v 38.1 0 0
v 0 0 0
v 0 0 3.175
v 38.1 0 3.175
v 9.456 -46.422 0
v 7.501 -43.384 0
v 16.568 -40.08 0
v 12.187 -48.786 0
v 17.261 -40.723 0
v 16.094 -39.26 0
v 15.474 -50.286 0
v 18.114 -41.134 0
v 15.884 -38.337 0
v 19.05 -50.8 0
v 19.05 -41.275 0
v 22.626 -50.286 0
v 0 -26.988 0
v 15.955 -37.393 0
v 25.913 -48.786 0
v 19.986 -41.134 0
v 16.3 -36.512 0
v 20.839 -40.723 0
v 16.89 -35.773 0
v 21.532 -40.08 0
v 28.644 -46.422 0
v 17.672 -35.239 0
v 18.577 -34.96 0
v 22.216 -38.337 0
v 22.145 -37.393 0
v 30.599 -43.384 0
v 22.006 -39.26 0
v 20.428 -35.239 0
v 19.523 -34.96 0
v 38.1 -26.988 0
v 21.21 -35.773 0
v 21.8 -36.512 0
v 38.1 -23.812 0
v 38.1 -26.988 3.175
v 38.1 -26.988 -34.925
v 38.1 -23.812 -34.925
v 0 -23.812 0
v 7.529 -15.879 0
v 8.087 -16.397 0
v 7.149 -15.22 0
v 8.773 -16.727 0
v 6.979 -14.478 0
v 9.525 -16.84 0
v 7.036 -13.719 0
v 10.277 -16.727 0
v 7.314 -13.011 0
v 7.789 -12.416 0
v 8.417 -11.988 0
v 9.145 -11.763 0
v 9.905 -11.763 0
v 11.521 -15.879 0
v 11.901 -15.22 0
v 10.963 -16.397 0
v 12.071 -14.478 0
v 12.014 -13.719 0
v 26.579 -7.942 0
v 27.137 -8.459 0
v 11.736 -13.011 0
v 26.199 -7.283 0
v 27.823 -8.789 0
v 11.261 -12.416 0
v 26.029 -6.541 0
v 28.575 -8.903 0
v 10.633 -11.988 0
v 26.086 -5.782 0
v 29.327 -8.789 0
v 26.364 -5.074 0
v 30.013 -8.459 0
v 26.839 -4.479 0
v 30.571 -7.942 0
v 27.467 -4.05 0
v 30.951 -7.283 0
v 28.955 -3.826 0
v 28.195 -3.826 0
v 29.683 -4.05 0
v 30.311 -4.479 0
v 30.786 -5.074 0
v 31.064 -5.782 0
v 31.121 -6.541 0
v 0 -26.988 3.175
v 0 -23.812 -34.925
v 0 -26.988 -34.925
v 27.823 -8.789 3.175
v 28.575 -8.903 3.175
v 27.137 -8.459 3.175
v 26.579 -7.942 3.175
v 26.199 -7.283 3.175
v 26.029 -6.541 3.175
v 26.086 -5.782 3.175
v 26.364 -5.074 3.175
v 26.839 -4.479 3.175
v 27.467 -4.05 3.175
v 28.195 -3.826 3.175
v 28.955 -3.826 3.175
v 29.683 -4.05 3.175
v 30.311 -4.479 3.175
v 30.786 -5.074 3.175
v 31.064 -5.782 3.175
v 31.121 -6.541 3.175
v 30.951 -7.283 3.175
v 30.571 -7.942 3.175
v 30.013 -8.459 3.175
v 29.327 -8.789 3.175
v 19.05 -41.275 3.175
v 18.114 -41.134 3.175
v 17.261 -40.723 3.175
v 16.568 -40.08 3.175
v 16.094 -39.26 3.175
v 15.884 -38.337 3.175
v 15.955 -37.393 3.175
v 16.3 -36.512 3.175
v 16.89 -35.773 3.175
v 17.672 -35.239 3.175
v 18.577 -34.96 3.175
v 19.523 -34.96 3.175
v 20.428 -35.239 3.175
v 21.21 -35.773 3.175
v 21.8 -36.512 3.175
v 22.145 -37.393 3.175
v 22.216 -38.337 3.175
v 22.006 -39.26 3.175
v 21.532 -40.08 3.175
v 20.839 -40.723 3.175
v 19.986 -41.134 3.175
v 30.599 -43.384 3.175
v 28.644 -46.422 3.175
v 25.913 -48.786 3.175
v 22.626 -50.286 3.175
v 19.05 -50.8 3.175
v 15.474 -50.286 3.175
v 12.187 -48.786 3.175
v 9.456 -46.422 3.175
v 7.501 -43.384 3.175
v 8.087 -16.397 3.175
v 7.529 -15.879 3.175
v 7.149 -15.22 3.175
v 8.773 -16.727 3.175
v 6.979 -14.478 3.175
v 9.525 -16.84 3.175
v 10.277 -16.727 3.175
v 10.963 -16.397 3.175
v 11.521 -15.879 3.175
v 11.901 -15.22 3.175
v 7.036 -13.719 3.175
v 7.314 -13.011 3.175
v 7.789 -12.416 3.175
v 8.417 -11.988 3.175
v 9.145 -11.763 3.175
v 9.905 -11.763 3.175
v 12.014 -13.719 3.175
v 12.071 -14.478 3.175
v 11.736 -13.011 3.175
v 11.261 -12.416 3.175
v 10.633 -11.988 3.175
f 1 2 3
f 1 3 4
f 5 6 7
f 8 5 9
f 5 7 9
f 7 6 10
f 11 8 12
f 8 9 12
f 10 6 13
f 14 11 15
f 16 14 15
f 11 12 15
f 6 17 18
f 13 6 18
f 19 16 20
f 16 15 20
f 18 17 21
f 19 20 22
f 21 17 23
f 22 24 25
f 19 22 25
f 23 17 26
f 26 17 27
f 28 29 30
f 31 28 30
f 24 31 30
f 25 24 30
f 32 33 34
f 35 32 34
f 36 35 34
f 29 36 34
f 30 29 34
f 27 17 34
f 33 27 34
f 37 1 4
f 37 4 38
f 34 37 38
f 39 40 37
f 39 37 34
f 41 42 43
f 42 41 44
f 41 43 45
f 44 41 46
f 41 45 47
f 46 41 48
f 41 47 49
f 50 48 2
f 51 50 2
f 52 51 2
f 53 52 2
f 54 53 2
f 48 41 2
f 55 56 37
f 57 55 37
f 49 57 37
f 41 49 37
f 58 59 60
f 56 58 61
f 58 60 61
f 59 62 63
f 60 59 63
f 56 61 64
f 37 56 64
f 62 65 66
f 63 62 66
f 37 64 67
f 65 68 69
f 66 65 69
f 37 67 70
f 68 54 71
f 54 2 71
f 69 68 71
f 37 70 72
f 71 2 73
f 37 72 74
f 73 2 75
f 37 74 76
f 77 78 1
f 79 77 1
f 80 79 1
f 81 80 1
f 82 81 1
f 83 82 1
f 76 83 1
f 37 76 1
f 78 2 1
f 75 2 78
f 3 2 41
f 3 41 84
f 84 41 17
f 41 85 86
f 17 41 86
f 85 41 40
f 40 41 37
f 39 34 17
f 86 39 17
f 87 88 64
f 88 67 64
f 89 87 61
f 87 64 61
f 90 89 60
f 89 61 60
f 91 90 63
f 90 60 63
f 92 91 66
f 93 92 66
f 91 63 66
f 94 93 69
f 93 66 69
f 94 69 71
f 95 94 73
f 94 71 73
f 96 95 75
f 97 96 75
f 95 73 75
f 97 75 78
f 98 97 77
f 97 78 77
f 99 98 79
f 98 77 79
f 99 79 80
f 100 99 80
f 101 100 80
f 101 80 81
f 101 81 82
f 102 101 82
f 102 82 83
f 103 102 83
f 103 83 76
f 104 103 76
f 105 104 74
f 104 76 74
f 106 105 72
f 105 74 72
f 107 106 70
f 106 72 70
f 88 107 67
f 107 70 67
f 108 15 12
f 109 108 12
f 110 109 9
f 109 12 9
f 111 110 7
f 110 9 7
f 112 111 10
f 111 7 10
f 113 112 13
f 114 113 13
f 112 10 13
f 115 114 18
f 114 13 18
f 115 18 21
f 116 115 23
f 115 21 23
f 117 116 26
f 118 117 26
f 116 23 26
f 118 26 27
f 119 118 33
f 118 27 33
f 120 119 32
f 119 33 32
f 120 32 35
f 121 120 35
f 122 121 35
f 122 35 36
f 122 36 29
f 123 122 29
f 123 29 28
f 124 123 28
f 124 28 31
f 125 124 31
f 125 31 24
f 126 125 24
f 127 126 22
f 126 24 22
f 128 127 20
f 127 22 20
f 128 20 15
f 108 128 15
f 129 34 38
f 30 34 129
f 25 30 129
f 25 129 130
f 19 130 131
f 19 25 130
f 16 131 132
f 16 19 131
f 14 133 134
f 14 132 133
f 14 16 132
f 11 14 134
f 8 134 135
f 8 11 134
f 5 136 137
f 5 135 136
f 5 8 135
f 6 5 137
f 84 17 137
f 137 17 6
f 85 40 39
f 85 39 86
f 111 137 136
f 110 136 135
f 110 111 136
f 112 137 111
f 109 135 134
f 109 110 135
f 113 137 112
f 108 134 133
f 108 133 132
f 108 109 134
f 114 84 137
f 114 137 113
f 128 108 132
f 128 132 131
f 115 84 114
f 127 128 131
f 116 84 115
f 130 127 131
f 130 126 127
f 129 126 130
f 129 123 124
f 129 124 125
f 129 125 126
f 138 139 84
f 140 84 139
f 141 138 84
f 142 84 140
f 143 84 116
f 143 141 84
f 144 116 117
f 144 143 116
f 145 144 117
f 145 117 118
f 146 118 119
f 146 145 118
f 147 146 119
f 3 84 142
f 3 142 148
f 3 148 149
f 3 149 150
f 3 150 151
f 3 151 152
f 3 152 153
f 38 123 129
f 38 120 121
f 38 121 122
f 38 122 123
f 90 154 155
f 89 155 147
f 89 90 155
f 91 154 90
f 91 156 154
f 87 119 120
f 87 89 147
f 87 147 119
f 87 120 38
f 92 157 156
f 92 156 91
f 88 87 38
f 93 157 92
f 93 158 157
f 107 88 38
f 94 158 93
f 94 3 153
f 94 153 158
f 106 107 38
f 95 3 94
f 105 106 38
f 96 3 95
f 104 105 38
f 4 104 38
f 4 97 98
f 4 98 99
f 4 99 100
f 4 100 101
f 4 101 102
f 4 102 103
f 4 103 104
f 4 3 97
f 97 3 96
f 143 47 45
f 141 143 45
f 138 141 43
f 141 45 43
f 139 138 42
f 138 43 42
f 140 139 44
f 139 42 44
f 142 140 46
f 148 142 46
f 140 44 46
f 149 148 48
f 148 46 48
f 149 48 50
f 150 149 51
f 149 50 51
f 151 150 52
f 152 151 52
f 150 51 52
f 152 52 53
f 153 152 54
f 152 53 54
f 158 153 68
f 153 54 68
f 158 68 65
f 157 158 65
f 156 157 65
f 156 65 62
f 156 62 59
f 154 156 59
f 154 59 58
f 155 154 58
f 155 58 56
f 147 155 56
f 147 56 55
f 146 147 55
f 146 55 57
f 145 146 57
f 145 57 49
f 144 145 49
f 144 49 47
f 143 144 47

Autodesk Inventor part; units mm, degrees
ref_plane "YZ Plane" through (0, 0, 0) normal (1, 0, 0) x (0, 1, 0)
ref_plane "XZ Plane" through (0, 0, 0) normal (0, 1, 0) x (-1, 0, 0)
ref_plane "XY Plane" through (0, 0, 0) normal (0, 0, 1) x (1, 0, 0)
sketch "Sketch1" plane through (0, 0, 0) normal (0, 0, 1) x (1, 0, 0)
  line L0 (0, 0) -> (38.1, 0)
  line L1 (38.1, 0) -> (38.1, -26.9875)
  line L2 (0, 0) -> (0, -26.9875)
  line L3 (0, -26.9875) -> (7.5012, -43.3836)
  line L4 (38.1, -26.9875) -> (30.5988, -43.3836)
  arc A0 (7.5012, -43.3836) -> (30.5988, -43.3836) centre (19.05, -38.1) ccw
  line L5 (38.1, -25.4) -> (0, -25.4) construction
  line L6 (38.1, -26.9875) -> (0, -26.9875) construction
  line L7 (38.1, -23.8125) -> (0, -23.8125) construction
  dimension "d1" = 38.1
  dimension "d2" = 12.7
  dimension "d36" = 38.1
  dimension "d37" = 25.4
  dimension "d38" = 1.5875
  dimension "d39" = 1.5875
extrude "Extrusion1" add sketch "Sketch1" along normal blind 3.175
sketch "Sketch2" plane through (0, 0, 0) normal (0, 0, -1) x (-1, 0, 0)
  line L0 (-38.1, 0) -> (-38.1, -26.9875) projected
  line L1 (0, -26.9875) -> (0, 0) projected
  line L2 (-38.1, -26.9875) -> (0, -26.9875)
  line L3 (0, -26.9875) -> (0, -23.8125)
  line L4 (0, -23.8125) -> (-38.1, -23.8125)
  line L5 (-38.1, -23.8125) -> (-38.1, -26.9875)
  arc A0 (-7.5012, -43.3836) -> (-30.5988, -43.3836) centre (-19.05, -38.1) ccw projected
  dimension "d13" = 3.175
extrude "Extrusion2" add sketch "Sketch2" along normal blind 34.925
sketch "Sketch3" plane through (0, 0, 3.175) normal (0, 0, 1) x (1, 0, 0)
  line L0 (7.5012, -43.3836) -> (0, -26.9875) projected
  arc A0 (30.5988, -43.3836) -> (7.5012, -43.3836) centre (19.05, -38.1) ccw projected
  line L1 (0, -26.9875) -> (0, 0) projected
  line L2 (0, 0) -> (38.1, 0) projected
  line L3 (38.1, 0) -> (38.1, -26.9875) projected
  line L4 (38.1, -23.8125) -> (0, -23.8125) projected
  line L5 (38.1, -23.8125) -> (0, -23.8125) projected
  point P0 (9.525, -14.2875)
  point P1 (28.575, -6.35)
  dimension "d18" = 9.525
  dimension "d20" = 6.35
  dimension "d21" = 9.525
  dimension "d40" = 9.525
hole "Hole1" at (9.525, -14.2875, 3.175) at (28.575, -6.35, 3.175) direction (0, 0, -1) diameter 5.1054 end through all clearance for "Flat Head Machine Screw (82)" size "#10" standard "Ansi Unified Screw Threads"
sketch "Sketch4" plane through (0, 0, 3.175) normal (0, 0, 1) x (1, 0, 0)
  arc A0 (30.5988, -43.3836) -> (7.5012, -43.3836) centre (19.05, -38.1) ccw projected
  point P0 (0, 0)
hole "Hole2" at (19.05, -38.1, 3.175) direction (0, 0, -1) diameter 6.35 end through all
properties part number "CLB_087_ClimberMountBracketGusset" material "Aluminum 6061"
